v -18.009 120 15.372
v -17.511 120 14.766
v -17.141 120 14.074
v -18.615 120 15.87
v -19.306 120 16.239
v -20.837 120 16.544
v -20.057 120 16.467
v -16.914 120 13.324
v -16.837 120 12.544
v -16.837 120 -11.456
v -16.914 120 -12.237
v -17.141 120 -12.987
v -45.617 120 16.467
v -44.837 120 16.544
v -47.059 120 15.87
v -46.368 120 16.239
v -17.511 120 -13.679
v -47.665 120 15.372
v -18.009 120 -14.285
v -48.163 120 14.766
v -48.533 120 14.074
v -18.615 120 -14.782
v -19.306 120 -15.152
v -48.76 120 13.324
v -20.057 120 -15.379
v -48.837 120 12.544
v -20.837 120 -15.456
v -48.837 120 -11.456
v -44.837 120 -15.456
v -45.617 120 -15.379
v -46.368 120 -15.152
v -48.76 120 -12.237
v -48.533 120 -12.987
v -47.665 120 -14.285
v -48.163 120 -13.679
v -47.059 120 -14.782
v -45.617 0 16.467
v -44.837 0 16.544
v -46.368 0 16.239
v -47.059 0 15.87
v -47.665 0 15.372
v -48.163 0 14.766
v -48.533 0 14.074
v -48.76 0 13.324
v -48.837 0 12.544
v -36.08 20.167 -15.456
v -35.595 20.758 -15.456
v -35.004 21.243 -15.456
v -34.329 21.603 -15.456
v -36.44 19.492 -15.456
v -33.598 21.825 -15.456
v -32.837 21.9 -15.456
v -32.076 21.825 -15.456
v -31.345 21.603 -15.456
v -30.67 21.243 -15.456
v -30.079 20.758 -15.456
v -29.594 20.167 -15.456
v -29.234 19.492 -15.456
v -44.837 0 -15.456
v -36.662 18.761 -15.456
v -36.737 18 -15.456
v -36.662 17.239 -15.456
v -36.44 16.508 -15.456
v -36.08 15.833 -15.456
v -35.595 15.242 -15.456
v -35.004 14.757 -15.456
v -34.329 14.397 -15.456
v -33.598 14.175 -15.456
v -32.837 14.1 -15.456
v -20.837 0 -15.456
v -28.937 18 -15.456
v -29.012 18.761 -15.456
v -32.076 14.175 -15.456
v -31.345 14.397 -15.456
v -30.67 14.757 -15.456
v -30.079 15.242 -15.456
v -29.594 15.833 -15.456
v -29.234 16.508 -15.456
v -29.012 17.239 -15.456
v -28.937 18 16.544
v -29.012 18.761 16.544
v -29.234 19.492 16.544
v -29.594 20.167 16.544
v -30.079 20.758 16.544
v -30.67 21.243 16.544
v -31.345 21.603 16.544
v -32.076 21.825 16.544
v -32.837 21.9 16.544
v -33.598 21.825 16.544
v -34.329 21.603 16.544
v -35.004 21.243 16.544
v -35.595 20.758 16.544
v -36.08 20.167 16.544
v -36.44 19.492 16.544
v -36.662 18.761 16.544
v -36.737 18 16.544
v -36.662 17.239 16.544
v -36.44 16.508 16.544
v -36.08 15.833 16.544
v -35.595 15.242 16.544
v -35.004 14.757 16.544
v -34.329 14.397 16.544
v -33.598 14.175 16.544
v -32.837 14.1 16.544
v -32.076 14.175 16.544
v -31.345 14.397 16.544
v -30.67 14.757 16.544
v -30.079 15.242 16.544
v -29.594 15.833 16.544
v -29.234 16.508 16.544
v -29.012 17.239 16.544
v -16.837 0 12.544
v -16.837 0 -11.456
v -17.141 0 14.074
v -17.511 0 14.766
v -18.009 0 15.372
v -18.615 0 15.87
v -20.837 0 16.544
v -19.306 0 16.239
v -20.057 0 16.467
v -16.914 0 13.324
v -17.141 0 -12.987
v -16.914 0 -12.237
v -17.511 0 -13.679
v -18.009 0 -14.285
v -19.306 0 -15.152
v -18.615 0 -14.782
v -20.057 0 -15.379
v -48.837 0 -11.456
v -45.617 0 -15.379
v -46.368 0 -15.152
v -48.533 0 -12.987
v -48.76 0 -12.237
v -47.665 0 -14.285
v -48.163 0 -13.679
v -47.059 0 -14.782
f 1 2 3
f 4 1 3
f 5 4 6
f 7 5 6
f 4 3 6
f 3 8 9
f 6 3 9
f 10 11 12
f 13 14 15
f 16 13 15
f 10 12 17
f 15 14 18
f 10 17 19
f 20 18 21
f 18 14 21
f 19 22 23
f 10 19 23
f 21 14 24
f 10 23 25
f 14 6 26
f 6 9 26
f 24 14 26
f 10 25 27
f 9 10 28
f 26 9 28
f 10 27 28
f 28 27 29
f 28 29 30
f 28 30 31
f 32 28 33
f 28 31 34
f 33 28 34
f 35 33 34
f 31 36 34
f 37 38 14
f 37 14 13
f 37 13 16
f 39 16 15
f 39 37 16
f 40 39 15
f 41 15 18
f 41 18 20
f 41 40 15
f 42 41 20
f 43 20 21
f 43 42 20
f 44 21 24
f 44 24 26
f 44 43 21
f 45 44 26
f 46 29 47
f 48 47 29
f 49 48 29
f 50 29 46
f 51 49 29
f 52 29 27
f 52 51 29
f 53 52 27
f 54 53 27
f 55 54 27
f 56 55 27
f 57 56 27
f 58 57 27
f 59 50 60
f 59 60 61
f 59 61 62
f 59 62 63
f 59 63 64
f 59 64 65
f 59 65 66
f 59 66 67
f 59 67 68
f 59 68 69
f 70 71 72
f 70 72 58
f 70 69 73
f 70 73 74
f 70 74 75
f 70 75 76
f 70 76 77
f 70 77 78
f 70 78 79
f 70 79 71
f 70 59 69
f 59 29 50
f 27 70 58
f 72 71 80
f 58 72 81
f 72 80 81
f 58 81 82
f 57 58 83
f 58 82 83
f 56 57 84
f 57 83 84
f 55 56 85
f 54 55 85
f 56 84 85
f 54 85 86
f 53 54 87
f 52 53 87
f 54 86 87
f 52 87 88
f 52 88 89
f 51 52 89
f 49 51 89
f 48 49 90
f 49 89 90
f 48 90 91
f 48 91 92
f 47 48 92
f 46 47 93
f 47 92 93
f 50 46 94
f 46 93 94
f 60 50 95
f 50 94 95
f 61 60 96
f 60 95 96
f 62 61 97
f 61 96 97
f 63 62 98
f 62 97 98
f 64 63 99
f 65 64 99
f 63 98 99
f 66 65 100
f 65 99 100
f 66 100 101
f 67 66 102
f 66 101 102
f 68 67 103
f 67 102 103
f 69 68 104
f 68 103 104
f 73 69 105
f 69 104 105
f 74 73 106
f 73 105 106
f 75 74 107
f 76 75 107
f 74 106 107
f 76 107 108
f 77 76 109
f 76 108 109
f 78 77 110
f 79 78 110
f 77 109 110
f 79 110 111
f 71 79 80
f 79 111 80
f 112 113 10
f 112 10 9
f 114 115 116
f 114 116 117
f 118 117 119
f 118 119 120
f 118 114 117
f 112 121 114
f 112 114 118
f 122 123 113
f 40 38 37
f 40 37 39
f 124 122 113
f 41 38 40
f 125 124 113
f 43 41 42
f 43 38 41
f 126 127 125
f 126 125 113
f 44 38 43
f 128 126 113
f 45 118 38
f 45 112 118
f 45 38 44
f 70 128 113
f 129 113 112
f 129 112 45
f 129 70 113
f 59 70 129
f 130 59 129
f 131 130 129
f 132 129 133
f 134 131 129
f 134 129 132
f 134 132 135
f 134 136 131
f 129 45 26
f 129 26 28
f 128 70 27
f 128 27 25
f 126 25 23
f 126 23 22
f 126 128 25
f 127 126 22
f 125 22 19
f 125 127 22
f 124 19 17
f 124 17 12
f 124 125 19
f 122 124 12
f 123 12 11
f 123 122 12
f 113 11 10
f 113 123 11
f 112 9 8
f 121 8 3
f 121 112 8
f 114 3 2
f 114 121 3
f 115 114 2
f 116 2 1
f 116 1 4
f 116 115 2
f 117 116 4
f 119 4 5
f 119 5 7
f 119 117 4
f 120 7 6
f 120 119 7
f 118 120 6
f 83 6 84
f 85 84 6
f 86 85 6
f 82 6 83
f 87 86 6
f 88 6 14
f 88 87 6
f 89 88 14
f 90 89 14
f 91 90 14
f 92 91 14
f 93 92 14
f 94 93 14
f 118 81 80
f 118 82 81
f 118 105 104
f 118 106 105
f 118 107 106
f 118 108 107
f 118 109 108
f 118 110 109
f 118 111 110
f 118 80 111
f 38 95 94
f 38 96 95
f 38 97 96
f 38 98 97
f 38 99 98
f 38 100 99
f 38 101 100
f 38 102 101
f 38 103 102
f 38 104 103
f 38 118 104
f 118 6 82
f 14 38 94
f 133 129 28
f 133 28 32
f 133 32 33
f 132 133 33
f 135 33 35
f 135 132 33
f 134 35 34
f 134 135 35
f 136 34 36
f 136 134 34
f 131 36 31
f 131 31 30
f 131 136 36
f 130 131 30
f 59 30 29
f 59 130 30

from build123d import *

# Parameters (mm, degrees)
SALIENTE_EXTRUIR1_DEPTH = 120
CROQUIS3_R              = 3.9
CORTAR_EXTRUIR1_DEPTH   = 32


with BuildPart() as part:
    # Croquis2 → Saliente-Extruir1 (new body)
    with BuildSketch(Plane(origin=(0, 0, 0), x_dir=(1, 0, 0), z_dir=(0, 1, 0))):
        with BuildLine():
            Line((-44.836996695, 15.45631068), (-20.836996695, 15.45631068))
            ThreePointArc((-20.836996695, 15.45631068), (-18.00856957, 14.284737804), (-16.836996695, 11.45631068))
            Line((-16.836996695, 11.45631068), (-16.836996695, -12.54368932))
            ThreePointArc((-16.836996695, -12.54368932), (-18.00856957, -15.372116445), (-20.836996695, -16.54368932))
            Line((-20.836996695, -16.54368932), (-44.836996695, -16.54368932))
            ThreePointArc((-44.836996695, -16.54368932), (-47.665423819, -15.372116445), (-48.836996695, -12.54368932))
            Line((-48.836996695, -12.54368932), (-48.836996695, 11.45631068))
            ThreePointArc((-48.836996695, 11.45631068), (-47.665423819, 14.284737804), (-44.836996695, 15.45631068))
        make_face()
    extrude(amount=SALIENTE_EXTRUIR1_DEPTH)

    # Croquis3 → Cortar-Extruir1 (cut)
    with BuildSketch(Plane.XY.offset(16.54368932)):
        with Locations((-32.836996695, 18)):
            Circle(CROQUIS3_R)
    extrude(amount=-CORTAR_EXTRUIR1_DEPTH, mode=Mode.SUBTRACT)


solid = part.part
